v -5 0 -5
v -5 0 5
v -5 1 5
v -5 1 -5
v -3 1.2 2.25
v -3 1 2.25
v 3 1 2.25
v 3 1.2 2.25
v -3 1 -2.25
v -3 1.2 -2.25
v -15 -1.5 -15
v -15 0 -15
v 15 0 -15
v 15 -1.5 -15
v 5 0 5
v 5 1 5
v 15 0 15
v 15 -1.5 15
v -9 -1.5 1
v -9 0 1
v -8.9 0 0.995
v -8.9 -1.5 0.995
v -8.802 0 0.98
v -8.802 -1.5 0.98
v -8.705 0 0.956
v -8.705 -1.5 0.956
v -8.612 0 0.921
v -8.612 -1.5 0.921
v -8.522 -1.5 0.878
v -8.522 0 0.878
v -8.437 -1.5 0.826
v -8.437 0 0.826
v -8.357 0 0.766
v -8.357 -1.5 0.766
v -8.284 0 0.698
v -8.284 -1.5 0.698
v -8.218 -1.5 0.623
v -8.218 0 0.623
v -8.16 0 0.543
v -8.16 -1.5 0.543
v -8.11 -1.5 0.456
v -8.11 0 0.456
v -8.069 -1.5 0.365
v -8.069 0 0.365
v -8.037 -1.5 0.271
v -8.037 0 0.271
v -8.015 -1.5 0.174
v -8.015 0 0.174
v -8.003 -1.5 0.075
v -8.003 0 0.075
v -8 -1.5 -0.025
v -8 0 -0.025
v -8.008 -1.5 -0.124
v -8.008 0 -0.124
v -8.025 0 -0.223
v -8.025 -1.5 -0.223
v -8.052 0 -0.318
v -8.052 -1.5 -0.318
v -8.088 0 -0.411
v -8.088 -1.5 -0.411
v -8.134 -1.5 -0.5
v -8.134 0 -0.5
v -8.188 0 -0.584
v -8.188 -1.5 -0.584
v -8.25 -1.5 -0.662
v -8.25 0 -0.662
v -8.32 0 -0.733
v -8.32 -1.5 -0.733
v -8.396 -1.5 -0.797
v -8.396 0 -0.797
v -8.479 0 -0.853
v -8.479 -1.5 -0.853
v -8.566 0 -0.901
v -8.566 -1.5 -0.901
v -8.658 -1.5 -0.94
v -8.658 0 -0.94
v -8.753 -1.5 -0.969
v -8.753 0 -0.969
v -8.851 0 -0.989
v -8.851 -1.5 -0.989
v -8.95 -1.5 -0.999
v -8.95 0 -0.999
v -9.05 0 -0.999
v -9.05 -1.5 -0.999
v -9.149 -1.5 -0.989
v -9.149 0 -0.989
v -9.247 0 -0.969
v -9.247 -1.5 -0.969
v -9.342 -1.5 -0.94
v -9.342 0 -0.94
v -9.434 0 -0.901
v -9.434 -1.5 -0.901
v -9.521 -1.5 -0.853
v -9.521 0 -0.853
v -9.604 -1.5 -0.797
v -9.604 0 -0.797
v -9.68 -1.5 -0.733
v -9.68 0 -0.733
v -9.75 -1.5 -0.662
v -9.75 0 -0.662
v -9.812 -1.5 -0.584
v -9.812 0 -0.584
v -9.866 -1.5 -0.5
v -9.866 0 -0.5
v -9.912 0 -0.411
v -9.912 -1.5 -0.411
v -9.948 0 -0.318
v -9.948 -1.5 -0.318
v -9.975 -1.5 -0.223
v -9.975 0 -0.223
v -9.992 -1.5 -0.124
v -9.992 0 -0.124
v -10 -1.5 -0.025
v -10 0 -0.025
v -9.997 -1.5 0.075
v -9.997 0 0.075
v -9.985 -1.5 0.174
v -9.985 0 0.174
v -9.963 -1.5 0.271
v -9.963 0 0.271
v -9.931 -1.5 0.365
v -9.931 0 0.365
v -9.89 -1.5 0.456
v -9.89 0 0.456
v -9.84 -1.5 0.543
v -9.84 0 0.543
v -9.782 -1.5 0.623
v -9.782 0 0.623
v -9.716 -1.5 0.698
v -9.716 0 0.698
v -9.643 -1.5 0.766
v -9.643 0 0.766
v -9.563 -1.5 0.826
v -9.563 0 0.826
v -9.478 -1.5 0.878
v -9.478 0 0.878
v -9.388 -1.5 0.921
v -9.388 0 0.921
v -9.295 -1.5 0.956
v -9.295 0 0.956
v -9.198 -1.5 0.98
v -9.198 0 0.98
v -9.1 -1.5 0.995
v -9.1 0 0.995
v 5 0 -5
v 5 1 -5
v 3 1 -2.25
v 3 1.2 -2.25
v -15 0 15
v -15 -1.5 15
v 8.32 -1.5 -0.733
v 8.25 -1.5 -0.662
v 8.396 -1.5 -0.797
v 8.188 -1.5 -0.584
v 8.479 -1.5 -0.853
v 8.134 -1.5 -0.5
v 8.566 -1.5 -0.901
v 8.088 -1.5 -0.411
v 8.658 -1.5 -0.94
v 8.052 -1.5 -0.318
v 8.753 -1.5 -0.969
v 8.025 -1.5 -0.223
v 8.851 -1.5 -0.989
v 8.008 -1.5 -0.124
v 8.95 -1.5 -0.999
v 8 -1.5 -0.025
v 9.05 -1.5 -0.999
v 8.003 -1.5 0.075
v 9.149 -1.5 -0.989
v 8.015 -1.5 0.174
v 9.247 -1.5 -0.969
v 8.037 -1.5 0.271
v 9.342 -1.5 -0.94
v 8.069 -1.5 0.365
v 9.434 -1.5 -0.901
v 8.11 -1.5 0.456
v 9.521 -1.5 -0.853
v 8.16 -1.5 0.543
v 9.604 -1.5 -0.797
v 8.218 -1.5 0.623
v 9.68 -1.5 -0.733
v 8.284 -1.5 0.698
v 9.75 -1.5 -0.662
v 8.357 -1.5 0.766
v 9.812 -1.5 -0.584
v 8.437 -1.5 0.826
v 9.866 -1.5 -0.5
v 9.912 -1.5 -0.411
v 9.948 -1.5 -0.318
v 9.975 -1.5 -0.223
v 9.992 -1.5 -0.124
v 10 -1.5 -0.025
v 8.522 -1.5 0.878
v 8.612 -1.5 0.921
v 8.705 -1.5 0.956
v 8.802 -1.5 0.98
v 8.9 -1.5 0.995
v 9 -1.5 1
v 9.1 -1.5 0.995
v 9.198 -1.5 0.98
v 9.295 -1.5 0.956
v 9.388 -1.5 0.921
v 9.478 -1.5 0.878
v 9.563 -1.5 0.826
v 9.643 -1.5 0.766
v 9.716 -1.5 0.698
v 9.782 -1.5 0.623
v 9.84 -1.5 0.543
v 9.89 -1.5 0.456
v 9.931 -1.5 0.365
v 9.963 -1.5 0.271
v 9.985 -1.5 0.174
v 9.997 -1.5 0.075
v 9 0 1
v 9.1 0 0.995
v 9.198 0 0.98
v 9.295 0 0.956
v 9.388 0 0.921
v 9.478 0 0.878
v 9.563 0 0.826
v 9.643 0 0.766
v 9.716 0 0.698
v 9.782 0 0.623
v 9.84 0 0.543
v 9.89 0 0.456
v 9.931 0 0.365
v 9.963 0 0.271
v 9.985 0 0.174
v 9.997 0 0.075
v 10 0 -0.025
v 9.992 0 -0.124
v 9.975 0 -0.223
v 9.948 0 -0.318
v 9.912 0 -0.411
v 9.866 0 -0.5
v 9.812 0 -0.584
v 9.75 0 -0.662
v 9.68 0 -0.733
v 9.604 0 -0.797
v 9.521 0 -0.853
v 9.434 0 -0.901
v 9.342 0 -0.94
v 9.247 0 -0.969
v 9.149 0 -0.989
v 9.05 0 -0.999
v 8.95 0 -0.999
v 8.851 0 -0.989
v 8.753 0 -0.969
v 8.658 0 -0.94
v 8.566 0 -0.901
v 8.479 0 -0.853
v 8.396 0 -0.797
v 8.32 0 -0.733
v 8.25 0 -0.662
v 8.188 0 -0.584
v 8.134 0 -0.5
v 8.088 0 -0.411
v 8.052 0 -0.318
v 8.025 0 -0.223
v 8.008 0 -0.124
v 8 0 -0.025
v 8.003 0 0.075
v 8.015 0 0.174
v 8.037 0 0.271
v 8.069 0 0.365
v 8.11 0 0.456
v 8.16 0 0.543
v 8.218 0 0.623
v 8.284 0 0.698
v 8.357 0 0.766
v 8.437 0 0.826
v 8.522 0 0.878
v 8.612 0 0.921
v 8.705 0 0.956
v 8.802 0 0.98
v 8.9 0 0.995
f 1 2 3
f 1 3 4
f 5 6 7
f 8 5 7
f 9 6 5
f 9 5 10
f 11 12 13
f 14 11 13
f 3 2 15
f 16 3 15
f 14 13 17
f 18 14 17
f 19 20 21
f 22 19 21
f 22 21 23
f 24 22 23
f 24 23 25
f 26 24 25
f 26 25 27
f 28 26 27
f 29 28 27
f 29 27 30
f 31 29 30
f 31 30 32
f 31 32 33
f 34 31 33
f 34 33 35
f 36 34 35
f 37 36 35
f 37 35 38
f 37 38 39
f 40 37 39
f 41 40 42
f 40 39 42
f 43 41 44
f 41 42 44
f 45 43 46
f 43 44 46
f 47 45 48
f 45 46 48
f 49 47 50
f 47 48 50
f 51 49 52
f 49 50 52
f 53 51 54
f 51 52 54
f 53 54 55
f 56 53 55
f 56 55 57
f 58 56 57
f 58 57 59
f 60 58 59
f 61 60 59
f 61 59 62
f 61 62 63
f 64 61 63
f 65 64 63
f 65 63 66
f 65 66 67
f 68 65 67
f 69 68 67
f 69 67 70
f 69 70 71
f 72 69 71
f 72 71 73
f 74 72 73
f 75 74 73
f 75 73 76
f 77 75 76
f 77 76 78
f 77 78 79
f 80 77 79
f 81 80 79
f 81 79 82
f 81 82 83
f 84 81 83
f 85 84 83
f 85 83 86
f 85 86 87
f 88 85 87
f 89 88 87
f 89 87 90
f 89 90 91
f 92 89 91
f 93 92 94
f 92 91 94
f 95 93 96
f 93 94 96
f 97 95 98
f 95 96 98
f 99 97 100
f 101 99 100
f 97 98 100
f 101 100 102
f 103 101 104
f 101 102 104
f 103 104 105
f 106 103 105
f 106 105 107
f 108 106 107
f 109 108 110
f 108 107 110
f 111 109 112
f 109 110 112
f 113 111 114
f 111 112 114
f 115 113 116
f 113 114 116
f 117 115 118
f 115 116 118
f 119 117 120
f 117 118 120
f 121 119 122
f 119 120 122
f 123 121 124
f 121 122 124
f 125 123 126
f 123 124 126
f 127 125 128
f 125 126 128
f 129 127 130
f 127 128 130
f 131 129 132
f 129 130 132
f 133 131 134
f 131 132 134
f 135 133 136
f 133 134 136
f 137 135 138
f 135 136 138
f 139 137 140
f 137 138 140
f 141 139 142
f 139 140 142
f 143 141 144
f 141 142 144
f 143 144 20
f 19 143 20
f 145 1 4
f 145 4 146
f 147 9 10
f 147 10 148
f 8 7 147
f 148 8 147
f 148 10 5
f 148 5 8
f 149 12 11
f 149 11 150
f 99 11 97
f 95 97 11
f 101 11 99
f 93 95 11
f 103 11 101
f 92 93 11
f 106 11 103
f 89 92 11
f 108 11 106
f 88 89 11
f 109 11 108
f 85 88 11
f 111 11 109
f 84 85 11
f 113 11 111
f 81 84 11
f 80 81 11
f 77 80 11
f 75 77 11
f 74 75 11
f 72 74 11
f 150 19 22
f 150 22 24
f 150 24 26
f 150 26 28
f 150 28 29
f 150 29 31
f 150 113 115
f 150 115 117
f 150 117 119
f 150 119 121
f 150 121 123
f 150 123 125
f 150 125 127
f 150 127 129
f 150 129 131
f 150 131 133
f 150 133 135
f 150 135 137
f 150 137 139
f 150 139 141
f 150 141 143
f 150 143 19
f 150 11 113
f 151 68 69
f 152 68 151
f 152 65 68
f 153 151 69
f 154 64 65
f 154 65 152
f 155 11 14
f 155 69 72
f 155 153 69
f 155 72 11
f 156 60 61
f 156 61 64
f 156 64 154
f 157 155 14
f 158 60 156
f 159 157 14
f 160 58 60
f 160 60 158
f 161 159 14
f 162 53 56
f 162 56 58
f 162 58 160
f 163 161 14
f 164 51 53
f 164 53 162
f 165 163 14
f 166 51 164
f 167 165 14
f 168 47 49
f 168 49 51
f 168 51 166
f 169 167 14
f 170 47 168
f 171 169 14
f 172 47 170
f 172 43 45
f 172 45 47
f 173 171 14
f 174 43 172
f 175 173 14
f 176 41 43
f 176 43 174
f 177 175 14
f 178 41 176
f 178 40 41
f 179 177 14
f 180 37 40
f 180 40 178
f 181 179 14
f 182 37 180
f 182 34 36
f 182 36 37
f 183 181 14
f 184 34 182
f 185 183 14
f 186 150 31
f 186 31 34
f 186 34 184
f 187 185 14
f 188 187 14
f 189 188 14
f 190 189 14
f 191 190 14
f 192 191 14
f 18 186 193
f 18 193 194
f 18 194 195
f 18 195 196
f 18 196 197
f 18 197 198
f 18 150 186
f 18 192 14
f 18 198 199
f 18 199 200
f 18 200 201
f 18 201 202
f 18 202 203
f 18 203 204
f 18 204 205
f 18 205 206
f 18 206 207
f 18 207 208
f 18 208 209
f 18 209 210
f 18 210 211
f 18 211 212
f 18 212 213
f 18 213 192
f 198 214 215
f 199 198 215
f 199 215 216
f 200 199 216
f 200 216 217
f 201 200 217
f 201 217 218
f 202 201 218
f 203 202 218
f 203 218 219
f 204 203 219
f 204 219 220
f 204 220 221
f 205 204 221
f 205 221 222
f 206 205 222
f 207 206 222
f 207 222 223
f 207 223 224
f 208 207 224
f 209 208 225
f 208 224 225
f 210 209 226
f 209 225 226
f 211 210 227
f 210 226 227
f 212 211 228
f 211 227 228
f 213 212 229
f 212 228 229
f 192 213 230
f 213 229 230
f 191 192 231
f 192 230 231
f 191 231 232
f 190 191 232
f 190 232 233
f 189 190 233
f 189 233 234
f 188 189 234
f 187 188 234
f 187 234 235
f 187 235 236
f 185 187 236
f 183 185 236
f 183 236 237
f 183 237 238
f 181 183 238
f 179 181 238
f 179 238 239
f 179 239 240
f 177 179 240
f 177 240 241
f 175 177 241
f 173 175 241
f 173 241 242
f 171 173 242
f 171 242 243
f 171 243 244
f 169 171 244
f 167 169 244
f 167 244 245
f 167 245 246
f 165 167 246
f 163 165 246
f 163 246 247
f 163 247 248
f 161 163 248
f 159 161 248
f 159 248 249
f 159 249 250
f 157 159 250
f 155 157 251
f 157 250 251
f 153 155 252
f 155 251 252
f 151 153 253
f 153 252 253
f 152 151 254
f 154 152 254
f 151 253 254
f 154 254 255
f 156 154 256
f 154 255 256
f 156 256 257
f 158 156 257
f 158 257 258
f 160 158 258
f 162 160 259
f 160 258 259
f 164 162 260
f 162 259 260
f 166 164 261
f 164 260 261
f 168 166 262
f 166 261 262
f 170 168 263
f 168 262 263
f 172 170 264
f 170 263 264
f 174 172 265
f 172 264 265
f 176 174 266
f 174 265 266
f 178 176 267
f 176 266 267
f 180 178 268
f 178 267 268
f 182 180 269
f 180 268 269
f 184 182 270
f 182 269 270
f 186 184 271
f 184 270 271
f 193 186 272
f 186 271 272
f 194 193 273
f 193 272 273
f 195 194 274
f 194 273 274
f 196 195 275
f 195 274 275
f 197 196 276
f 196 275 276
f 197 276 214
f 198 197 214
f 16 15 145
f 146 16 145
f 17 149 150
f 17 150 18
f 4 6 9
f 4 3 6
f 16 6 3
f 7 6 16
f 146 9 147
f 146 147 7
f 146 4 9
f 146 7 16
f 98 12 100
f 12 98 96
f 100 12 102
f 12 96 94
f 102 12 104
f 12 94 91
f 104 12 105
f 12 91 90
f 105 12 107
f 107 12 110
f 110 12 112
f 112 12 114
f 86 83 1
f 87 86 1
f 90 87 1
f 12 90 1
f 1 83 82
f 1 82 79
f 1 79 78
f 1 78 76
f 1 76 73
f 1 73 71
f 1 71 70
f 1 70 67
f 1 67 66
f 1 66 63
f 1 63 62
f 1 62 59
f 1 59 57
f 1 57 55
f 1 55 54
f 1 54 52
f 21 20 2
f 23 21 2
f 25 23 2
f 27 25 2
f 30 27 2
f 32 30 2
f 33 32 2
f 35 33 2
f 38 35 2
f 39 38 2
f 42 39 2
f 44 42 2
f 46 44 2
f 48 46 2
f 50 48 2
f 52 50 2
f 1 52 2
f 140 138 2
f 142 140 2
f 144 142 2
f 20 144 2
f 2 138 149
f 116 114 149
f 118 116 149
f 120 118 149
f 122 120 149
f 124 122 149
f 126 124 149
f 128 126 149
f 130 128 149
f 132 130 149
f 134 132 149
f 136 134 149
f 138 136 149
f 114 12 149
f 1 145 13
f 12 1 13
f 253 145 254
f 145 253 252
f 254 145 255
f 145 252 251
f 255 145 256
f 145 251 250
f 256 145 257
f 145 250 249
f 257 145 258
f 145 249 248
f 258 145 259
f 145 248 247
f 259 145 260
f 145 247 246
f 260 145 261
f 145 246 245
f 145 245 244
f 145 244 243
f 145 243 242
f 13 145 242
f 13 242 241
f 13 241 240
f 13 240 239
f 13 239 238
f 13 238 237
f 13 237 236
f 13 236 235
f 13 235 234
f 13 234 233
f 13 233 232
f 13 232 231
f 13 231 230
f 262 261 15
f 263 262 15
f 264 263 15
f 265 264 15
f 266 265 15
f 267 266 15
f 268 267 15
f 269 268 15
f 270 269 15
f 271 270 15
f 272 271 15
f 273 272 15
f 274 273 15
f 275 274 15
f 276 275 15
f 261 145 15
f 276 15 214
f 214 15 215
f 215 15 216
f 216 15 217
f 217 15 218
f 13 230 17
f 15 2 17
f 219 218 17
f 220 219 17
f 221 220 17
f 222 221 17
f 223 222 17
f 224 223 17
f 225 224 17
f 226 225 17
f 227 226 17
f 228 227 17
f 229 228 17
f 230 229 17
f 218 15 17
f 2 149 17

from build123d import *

# Parameters (mm, degrees)
SKETCH_1_W          = 10
SKETCH_1_H          = 10
EXTRUDE_1_DEPTH     = 1
SKETCH_2_W          = 6
SKETCH_2_H          = 4.5
EXTRUDE_2_DEPTH     = 0.2
SKETCH_3_W          = 30
SKETCH_3_H          = 30
EXTRUDE_3_DEPTH     = 1.5
SKETCH_4_R          = 1
CUT_EXTRUDE_2_DEPTH = 22.266170318


with BuildPart() as part:
    # 草图1 → 凸台-拉伸1 (new body)
    with BuildSketch(Plane(origin=(0, 0, 0), x_dir=(1, 0, 0), z_dir=(0, 1, 0))):
        Rectangle(SKETCH_1_W, SKETCH_1_H)
    extrude(amount=EXTRUDE_1_DEPTH)

    # 草图2 → 凸台-拉伸2 (add)
    with BuildSketch(Plane(origin=(0, 1, 0), x_dir=(1, 0, 0), z_dir=(0, 1, 0))):
        Rectangle(SKETCH_2_W, SKETCH_2_H)
    extrude(amount=EXTRUDE_2_DEPTH)

    # 草图3 → 凸台-拉伸3 (add)
    with BuildSketch(Plane.XZ):
        Rectangle(SKETCH_3_W, SKETCH_3_H)
    extrude(amount=EXTRUDE_3_DEPTH)

    # 草图4 → 切除-拉伸2 (cut, through all)
    with BuildSketch(Plane(origin=(0, 0, 0), x_dir=(1, 0, 0), z_dir=(0, 1, 0))):
        with Locations((9, 0)):
            Circle(SKETCH_4_R)
        with Locations((-9, 0)):
            Circle(SKETCH_4_R)
    extrude(amount=-CUT_EXTRUDE_2_DEPTH, mode=Mode.SUBTRACT)


solid = part.part
